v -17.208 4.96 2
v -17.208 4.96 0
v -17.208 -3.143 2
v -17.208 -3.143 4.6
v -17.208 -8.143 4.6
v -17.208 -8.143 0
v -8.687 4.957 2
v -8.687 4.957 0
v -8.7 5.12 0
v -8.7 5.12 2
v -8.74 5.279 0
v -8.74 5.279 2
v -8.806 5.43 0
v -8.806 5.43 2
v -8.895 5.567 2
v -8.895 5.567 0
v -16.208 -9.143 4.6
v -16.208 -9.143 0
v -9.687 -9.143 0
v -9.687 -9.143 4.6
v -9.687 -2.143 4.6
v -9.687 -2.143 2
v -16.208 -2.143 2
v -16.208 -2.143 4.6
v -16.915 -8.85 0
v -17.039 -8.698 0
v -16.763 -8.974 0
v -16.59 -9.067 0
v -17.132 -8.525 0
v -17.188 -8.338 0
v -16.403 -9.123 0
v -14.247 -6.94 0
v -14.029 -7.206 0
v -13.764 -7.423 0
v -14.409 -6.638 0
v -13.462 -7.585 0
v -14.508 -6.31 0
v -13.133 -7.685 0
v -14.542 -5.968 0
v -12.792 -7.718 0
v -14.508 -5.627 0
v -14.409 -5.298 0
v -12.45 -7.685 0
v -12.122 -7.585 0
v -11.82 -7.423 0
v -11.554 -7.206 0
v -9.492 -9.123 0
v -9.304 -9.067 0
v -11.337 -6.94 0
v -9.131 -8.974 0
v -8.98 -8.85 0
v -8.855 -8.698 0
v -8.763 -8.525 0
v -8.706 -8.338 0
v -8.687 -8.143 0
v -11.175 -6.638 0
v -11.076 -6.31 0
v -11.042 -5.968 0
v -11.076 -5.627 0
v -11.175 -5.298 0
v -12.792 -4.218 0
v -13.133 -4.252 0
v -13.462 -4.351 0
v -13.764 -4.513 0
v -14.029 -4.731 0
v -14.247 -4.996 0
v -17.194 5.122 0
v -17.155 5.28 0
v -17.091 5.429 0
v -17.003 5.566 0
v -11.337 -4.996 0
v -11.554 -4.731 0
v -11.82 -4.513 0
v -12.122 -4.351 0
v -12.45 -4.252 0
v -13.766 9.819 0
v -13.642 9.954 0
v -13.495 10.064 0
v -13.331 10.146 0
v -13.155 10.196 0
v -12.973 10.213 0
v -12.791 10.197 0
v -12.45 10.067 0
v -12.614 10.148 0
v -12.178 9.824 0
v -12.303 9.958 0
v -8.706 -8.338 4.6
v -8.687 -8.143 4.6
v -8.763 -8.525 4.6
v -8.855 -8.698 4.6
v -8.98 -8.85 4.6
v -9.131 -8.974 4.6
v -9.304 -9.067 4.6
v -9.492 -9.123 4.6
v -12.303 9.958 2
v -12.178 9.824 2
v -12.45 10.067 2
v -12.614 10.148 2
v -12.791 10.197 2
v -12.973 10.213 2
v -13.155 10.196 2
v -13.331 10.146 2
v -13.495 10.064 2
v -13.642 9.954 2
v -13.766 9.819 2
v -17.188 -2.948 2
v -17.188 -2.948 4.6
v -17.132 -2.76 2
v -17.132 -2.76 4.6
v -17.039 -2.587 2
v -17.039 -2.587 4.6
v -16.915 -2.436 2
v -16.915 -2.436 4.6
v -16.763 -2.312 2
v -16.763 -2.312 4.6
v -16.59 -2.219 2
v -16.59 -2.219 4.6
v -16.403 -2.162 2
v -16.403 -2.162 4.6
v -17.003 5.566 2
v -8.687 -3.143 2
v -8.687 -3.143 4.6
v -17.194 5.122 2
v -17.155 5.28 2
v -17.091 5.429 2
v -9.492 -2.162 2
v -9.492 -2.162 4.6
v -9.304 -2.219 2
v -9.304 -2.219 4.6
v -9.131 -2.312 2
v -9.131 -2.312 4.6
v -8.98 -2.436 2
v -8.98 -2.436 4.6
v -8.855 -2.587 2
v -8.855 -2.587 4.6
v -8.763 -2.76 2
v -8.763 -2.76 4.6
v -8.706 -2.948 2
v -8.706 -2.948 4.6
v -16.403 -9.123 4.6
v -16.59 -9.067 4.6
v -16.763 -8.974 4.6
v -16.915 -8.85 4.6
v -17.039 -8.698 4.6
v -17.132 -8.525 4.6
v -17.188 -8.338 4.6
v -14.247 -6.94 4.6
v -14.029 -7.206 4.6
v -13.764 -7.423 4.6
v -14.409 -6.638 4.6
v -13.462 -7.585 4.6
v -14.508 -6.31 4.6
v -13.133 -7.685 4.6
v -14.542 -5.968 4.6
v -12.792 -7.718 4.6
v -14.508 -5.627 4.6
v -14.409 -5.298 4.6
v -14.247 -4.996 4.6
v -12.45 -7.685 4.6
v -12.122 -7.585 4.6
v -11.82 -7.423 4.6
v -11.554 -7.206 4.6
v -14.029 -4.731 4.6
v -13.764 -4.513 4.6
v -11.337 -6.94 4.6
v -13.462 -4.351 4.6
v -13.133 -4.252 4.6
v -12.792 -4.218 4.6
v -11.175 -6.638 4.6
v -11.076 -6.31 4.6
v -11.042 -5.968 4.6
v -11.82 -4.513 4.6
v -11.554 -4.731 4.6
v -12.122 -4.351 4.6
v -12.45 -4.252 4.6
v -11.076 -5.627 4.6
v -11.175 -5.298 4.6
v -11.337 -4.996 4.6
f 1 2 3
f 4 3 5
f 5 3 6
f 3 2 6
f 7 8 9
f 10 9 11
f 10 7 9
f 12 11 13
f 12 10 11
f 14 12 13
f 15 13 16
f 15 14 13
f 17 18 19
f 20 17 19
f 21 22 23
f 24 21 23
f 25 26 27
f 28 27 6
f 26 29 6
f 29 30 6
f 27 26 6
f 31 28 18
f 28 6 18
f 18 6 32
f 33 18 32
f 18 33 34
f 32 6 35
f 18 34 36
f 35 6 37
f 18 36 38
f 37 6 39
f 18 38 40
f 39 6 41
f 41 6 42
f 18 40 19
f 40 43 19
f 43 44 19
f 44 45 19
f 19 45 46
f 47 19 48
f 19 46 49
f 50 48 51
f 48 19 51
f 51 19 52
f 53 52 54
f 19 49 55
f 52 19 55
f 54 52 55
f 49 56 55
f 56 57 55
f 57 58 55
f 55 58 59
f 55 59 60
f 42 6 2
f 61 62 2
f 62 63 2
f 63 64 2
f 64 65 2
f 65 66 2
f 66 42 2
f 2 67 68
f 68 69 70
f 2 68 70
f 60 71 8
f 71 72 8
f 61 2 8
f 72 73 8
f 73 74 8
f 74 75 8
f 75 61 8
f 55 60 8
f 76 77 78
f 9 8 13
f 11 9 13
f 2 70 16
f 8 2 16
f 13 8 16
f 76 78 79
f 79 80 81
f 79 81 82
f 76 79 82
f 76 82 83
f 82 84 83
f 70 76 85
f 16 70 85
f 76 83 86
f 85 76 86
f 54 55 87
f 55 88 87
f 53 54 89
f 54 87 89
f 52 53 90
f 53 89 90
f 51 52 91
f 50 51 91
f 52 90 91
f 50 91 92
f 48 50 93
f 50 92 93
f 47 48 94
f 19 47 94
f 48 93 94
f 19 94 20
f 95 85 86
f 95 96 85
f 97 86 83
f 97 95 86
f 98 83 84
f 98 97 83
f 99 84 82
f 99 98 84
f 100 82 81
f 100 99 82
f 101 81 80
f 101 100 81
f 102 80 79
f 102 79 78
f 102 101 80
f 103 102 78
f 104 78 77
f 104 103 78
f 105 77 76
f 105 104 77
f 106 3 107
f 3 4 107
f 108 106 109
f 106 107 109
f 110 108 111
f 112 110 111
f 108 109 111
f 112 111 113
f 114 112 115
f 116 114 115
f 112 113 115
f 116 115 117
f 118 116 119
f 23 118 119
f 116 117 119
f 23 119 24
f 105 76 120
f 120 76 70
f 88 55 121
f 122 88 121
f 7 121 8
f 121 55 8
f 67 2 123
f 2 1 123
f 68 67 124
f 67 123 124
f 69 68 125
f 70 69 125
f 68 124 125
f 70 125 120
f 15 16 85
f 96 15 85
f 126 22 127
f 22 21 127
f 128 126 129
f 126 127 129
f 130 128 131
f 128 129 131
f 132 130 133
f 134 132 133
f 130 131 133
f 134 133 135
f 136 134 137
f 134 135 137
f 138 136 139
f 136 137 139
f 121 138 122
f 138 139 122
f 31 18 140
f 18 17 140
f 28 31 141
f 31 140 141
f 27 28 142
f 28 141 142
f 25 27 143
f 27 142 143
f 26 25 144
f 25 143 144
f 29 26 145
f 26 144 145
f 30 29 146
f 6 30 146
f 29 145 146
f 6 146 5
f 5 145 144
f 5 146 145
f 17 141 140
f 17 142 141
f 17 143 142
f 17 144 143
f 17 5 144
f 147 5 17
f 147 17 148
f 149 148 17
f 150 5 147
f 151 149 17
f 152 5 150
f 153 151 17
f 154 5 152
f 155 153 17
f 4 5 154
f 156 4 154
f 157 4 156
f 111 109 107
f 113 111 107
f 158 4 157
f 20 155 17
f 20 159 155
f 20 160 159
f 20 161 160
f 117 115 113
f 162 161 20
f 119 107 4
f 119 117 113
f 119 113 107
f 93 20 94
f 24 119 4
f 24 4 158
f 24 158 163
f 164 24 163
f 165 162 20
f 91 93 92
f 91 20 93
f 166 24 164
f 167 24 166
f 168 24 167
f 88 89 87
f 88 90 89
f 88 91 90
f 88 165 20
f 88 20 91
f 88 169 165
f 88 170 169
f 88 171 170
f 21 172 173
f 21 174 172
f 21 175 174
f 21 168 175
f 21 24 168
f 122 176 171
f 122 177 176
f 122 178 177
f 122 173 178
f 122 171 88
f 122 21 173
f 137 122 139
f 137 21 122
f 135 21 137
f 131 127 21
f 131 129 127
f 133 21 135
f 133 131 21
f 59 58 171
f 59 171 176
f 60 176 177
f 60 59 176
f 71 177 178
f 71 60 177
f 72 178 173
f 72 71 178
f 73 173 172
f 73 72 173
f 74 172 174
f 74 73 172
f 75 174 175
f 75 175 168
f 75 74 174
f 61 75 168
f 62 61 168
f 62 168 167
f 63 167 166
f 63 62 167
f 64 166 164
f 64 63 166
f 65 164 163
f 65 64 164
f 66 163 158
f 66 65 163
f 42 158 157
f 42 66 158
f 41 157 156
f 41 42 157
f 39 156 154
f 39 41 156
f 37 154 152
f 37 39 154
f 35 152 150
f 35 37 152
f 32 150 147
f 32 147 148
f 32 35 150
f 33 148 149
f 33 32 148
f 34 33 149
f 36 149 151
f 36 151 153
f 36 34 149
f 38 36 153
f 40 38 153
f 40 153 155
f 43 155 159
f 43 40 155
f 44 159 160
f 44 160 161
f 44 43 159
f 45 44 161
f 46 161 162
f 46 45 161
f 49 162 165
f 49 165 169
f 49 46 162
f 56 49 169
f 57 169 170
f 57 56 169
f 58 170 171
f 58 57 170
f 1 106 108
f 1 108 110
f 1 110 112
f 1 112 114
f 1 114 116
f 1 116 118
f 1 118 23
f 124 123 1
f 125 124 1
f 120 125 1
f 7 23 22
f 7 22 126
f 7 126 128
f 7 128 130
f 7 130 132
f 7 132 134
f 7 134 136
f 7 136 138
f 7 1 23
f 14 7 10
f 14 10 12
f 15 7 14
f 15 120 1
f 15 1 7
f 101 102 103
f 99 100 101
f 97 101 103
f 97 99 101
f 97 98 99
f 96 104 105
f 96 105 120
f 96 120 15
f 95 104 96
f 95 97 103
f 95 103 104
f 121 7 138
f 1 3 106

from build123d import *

# Parameters (mm, degrees)
F0_R     = 1.75
F1_DEPTH = 4.6
F2_DEPTH = 2
F3_R     = 1
F4_R     = 1
F5_R     = 1
F6_R     = 1


with BuildPart() as f1:
    # F0 (on Top) → F1 (new body)
    with BuildSketch(Plane.XY):
        Polygon((-17.207691, -2.142988), (-17.207691, -9.142705), (-8.686733, -9.142705), (-8.686733, -2.142988), (-16.240229, -2.142988), align=None)
        with Locations((-12.791907, -5.968139)):
            Circle(F0_R, mode=Mode.SUBTRACT)
    extrude(amount=F1_DEPTH)

    # F0 (on Top) → F2 (join)
    with BuildSketch(Plane.XY):
        Polygon((-17.207691, 5.29756), (-17.207691, -2.142988), (-16.240229, -2.142988), (-8.686733, -2.142988), (-8.686733, 5.29756), (-12.975041, 10.857295), align=None)
    extrude(amount=F2_DEPTH)

    # F3
    f3_edges = [f1.edges().sort_by_distance(p)[0] for p in [
        (-8.686733, -9.142705, 2.3),
    ]]
    fillet(f3_edges, radius=F3_R)

    # F4
    f4_edges = [f1.edges().sort_by_distance(p)[0] for p in [
        (-17.207691, -9.142705, 2.3),
    ]]
    fillet(f4_edges, radius=F4_R)

    # F5
    f5_edges = [f1.edges().sort_by_distance(p)[0] for p in [
        (-17.207691, -2.142988, 3.3),
    ]]
    fillet(f5_edges, radius=F5_R)

    # F6
    f6_edges = [f1.edges().sort_by_distance(p)[0] for p in [
        (-8.686733, -2.142988, 3.3),
        (-12.975041, 10.857295, 1),
        (-8.686733, 5.29756, 1),
        (-17.207691, 5.29756, 1),
    ]]
    fillet(f6_edges, radius=F6_R)


solid = f1.part
